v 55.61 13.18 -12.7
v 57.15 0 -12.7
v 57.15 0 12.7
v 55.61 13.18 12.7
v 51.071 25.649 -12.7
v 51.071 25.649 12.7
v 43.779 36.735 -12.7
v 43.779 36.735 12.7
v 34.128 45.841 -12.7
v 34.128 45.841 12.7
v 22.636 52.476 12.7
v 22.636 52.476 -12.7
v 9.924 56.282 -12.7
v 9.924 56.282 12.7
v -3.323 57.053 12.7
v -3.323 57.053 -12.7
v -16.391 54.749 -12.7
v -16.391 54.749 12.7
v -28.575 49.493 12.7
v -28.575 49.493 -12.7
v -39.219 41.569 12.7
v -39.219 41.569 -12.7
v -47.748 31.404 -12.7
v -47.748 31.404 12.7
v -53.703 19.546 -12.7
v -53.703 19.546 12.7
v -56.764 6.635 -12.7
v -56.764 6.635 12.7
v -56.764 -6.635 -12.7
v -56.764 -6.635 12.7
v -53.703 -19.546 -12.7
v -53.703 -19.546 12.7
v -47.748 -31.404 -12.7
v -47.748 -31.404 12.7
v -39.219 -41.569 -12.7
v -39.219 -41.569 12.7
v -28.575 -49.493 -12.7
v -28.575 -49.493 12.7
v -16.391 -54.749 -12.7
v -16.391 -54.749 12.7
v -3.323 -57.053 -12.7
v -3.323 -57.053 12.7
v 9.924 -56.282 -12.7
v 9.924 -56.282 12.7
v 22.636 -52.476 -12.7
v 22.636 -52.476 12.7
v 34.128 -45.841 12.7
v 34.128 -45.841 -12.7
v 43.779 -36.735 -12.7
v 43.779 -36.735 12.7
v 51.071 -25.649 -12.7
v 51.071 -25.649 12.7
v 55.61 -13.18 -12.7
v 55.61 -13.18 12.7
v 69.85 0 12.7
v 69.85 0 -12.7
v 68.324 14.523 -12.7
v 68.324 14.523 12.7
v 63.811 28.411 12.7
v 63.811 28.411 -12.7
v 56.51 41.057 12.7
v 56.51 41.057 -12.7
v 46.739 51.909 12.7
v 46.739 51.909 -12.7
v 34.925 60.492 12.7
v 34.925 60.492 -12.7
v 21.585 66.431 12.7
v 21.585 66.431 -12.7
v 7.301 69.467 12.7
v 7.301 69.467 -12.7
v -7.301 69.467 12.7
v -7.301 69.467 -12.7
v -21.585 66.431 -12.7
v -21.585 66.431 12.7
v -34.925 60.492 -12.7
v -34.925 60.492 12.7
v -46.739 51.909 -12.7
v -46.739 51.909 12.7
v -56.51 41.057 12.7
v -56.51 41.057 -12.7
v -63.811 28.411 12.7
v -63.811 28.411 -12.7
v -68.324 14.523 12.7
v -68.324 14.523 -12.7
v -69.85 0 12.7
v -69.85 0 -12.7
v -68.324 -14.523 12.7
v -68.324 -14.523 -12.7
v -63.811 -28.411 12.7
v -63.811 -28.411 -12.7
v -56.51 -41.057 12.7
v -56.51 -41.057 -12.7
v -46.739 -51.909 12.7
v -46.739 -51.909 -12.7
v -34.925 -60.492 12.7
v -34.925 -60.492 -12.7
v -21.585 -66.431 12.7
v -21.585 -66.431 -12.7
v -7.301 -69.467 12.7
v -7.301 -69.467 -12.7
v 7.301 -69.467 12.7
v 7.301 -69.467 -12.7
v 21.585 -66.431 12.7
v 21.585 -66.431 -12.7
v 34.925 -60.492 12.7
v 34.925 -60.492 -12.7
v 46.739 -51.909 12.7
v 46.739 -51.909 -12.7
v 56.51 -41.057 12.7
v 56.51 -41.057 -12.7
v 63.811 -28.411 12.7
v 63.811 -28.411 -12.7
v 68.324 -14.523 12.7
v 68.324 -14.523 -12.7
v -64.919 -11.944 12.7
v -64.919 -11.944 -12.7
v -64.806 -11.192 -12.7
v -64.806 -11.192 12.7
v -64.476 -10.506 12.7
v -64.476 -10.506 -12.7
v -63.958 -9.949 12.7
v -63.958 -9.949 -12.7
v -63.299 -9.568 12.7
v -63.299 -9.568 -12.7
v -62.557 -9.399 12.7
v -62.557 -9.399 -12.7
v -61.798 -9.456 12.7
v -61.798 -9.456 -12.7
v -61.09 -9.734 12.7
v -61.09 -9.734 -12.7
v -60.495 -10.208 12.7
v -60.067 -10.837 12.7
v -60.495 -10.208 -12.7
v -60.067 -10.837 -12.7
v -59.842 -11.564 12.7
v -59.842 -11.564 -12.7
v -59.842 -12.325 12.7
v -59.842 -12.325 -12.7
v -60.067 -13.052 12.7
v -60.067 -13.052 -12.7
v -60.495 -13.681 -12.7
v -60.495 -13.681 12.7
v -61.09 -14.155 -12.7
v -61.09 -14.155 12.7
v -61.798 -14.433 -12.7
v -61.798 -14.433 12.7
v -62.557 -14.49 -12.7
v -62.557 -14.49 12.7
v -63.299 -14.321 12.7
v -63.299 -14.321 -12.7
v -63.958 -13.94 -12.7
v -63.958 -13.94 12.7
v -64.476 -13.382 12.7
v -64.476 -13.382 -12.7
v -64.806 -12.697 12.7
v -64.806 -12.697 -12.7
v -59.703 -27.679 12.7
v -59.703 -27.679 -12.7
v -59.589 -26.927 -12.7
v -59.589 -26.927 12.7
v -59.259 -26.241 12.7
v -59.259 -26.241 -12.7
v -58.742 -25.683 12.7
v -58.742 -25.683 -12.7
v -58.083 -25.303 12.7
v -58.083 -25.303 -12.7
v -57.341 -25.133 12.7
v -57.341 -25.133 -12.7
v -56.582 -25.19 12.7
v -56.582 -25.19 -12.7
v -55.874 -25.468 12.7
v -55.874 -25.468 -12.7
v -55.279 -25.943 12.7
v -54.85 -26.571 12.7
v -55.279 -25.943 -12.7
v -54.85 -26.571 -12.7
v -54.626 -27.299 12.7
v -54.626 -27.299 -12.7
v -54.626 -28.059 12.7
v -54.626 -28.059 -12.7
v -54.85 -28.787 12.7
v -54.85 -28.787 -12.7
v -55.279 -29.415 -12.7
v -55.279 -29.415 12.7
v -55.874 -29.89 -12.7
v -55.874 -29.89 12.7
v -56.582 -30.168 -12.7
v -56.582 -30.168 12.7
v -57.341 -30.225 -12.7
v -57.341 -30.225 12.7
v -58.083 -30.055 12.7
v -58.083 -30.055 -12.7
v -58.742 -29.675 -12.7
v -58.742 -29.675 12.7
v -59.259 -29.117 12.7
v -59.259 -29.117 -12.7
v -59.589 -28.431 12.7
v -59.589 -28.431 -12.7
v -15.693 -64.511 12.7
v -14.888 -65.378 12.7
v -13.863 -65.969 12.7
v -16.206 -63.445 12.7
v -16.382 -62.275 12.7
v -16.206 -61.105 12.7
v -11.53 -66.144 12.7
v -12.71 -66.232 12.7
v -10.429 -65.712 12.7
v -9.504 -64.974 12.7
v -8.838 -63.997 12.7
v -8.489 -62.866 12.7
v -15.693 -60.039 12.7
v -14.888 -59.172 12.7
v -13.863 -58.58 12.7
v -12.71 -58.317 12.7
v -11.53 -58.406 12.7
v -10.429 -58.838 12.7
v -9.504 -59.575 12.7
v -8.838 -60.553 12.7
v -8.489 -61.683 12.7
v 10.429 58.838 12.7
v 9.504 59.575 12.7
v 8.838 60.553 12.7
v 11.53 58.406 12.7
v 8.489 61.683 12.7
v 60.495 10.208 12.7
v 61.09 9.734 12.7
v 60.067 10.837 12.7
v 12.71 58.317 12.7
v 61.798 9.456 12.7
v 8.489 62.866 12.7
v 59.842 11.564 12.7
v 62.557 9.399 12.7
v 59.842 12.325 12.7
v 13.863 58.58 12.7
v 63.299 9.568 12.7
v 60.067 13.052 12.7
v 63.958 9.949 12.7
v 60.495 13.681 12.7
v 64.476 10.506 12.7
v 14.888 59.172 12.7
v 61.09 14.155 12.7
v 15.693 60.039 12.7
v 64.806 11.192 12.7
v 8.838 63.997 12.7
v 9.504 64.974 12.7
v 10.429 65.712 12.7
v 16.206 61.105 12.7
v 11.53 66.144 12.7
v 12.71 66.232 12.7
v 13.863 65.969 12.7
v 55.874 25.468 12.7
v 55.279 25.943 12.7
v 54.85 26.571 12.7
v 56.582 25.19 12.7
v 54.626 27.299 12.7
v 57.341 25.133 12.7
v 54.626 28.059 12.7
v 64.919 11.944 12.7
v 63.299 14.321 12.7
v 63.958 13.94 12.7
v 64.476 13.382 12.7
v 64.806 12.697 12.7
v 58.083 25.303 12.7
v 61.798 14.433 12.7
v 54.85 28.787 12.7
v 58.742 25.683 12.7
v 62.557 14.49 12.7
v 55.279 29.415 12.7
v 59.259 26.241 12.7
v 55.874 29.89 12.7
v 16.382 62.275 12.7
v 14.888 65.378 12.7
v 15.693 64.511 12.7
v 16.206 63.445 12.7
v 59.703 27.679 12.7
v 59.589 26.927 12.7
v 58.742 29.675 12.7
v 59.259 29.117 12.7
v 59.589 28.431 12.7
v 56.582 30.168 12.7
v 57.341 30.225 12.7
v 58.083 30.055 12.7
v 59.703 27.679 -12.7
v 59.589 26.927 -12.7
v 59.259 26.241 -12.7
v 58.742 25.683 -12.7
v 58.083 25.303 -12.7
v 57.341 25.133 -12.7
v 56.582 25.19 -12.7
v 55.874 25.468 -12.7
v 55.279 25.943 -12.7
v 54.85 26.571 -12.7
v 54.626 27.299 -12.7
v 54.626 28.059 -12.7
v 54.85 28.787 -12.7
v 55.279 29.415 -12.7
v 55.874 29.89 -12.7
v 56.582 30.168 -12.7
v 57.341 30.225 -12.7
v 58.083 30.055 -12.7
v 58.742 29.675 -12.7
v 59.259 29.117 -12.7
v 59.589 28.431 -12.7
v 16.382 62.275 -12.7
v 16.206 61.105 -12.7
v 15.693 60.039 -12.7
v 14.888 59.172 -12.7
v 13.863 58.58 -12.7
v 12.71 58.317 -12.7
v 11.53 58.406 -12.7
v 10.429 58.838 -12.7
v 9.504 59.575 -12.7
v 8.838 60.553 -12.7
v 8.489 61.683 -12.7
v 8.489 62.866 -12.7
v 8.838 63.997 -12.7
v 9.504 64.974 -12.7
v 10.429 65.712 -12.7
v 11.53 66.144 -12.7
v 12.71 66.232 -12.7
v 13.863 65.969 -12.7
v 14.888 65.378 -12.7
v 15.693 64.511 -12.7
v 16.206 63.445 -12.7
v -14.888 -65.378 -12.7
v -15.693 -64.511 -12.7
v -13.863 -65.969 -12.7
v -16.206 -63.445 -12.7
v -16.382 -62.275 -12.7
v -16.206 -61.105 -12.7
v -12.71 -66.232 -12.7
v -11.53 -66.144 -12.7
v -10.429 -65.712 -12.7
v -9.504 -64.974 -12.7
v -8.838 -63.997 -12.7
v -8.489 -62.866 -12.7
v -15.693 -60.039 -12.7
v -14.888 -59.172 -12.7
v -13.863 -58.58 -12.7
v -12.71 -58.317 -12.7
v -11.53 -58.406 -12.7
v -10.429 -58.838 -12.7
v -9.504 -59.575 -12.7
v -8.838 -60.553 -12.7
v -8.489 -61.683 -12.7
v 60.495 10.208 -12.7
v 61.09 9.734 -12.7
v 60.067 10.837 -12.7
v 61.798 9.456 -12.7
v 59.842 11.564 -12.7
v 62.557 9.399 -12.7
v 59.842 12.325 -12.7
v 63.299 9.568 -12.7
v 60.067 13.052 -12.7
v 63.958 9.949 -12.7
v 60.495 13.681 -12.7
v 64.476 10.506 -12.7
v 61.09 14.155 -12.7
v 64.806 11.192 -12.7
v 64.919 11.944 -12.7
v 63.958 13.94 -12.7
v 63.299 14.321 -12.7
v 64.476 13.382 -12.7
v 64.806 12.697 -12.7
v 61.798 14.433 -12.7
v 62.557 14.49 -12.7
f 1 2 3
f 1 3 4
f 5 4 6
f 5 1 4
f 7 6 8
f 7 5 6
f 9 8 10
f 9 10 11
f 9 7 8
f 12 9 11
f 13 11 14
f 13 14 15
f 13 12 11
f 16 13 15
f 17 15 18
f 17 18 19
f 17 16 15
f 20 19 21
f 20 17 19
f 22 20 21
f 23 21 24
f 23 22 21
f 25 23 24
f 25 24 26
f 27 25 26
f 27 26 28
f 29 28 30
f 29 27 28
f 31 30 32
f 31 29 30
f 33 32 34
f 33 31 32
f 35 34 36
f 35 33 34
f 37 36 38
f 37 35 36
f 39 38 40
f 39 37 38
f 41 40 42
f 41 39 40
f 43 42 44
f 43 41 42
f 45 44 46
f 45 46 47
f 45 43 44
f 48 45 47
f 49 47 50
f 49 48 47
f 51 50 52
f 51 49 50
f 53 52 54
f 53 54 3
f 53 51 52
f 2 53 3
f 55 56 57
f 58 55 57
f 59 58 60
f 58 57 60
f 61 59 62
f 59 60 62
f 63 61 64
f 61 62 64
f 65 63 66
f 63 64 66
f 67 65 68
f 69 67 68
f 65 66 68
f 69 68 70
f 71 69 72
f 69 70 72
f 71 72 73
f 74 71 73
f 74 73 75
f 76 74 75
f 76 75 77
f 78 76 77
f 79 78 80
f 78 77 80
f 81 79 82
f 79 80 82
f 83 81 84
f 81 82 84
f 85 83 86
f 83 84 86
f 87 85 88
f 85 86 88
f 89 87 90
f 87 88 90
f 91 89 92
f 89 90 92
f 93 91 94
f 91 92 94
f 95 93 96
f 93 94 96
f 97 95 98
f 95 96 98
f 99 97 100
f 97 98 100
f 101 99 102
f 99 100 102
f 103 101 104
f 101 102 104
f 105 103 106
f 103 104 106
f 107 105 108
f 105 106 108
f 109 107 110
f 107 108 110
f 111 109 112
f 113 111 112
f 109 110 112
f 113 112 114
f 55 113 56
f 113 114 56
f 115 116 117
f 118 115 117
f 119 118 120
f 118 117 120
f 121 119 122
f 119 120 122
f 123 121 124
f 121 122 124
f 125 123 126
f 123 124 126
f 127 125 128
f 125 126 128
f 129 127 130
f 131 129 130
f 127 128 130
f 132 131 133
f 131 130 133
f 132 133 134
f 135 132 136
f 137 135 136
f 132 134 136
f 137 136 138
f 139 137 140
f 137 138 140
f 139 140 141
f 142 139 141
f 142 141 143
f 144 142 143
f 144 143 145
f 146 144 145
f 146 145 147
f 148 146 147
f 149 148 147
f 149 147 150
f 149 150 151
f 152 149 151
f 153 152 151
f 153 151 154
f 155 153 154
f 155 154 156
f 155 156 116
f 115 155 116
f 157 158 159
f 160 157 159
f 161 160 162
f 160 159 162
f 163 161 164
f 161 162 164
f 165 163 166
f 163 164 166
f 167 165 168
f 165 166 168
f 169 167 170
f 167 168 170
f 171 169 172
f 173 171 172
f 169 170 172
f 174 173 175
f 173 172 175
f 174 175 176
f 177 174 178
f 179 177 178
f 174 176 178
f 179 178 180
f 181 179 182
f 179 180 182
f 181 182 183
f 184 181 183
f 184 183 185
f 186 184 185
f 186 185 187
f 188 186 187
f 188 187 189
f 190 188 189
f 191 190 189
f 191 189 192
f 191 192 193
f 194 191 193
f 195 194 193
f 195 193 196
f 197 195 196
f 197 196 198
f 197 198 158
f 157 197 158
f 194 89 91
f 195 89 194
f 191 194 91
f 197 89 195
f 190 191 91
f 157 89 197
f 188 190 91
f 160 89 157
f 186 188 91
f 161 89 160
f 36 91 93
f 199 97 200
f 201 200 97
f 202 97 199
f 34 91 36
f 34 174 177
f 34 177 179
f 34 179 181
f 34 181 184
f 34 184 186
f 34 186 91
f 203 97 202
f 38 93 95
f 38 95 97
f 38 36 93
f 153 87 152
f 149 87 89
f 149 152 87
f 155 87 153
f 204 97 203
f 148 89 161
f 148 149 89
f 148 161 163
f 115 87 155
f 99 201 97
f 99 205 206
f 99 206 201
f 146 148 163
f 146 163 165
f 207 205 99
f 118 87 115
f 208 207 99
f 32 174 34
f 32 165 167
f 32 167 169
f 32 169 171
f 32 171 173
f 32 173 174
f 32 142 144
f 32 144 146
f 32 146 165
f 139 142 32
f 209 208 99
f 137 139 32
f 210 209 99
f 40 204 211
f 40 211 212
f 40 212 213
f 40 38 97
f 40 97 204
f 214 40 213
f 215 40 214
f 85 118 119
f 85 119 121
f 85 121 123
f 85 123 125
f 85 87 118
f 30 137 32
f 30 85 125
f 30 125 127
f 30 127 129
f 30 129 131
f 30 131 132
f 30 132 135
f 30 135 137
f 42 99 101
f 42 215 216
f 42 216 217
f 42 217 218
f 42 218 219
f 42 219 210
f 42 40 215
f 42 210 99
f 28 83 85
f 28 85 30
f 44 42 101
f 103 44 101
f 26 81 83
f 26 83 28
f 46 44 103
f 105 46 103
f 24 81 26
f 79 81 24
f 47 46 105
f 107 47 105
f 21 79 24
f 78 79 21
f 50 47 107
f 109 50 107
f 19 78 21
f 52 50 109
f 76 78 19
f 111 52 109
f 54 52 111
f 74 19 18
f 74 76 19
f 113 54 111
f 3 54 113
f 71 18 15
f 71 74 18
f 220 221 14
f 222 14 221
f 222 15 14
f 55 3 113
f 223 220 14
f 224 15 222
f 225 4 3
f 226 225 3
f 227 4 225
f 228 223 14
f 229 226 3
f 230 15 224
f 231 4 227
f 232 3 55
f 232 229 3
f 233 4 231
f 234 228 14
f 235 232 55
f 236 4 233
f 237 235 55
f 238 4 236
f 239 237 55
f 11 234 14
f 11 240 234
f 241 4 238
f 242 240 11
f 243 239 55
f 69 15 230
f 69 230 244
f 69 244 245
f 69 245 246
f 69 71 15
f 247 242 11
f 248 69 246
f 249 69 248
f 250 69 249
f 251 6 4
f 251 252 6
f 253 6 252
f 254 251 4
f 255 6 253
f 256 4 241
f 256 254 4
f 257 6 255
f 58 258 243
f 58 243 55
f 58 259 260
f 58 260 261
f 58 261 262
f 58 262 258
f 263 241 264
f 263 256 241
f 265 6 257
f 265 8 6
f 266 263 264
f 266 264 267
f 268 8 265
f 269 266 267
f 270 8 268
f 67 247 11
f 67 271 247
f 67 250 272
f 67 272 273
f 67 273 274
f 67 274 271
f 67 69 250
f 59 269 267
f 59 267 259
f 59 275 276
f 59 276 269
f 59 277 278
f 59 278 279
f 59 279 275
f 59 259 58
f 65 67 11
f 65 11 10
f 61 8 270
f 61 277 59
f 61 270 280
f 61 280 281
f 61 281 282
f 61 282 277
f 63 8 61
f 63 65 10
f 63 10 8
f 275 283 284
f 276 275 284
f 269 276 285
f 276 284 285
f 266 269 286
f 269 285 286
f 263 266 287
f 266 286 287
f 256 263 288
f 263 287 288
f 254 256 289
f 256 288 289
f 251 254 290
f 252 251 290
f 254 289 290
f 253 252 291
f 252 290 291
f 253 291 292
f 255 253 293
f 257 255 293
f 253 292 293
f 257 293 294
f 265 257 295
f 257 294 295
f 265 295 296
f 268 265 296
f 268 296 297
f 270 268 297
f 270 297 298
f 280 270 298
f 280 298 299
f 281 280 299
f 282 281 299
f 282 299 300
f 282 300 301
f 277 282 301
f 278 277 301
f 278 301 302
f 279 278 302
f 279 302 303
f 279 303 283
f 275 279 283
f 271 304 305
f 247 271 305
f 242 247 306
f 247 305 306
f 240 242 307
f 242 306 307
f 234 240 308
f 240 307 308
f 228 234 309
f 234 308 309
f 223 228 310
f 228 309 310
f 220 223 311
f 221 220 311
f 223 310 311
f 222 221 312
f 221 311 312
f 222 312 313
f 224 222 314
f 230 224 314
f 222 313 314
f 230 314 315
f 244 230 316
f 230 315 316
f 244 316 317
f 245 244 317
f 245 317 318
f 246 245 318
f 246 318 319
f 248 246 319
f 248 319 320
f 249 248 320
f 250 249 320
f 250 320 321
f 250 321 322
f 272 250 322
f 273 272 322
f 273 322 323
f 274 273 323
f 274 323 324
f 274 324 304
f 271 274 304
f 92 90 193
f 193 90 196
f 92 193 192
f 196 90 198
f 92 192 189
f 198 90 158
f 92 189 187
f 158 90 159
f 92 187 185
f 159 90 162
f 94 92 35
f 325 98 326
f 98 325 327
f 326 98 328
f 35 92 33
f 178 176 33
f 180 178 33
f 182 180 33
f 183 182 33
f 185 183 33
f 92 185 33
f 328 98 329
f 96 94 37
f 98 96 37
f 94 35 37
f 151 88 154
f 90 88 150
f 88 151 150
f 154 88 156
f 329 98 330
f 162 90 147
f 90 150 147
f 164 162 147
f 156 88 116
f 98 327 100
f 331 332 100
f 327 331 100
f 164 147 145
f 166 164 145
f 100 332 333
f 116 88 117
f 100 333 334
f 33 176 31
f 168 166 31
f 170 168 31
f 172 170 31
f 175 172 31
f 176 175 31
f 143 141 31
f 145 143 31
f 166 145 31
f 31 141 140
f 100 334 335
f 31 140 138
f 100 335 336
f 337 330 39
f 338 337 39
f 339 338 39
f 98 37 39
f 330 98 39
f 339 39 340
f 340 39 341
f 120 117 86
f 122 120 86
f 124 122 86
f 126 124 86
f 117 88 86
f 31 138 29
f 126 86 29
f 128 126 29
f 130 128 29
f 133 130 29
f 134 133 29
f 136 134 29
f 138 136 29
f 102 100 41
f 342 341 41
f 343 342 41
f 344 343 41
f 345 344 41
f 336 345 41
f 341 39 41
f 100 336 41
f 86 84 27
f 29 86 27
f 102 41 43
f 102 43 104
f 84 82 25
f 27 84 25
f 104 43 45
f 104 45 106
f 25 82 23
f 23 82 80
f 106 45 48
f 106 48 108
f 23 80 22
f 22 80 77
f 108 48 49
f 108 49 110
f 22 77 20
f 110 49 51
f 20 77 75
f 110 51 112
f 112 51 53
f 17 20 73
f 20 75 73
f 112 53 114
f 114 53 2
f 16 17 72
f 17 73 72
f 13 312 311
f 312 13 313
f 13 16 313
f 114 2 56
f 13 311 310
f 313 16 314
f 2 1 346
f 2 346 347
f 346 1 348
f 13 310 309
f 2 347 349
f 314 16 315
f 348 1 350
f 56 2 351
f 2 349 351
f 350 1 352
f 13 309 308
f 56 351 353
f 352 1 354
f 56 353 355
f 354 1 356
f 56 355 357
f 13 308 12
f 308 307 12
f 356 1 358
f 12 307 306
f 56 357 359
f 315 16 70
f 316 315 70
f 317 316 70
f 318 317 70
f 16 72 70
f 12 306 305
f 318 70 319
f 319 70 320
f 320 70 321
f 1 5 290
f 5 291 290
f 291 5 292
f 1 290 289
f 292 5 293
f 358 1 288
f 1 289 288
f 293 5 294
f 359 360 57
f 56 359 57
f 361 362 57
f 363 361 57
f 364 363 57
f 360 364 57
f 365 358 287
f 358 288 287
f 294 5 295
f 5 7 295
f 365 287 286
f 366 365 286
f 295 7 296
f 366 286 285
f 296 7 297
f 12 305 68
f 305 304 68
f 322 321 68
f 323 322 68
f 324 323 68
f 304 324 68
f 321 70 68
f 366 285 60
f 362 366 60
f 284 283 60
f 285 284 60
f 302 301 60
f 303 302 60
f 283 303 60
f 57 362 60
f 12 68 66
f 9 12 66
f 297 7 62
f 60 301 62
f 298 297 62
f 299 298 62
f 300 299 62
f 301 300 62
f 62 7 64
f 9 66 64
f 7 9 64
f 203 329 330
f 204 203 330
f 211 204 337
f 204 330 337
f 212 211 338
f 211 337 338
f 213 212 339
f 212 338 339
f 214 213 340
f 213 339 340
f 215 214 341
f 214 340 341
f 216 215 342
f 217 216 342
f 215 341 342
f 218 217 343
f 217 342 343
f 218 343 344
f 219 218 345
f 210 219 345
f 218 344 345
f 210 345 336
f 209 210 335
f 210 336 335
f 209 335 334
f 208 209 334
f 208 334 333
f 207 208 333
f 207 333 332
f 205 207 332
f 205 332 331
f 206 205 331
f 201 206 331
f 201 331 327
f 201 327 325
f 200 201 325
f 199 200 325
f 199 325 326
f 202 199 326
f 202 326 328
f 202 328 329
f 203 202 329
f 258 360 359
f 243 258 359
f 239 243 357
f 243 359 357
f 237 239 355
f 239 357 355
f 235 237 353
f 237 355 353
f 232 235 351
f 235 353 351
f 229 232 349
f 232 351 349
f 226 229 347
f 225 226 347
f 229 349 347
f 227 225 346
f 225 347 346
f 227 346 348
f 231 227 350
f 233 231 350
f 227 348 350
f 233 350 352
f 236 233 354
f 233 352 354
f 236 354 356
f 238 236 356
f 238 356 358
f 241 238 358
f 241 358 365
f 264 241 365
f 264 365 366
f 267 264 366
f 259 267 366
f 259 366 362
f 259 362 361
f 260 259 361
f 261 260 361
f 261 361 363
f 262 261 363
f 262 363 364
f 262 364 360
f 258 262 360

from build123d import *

# Parameters (mm, degrees)
BOSS_EXTRUDE1_DEPTH            = 12.7
BOSS_EXTRUDE1_DEPTH_BACK       = 12.7
SKETCH3_R                      = 69.85
SKETCH3_R_2                    = 57.15
TAP_DRILL_FOR_1_4_20_TAP1_D    = 5.1054
F_5_16_0_3125_DIAMETER_HOLE1_D = 7.9375
CIRPATTERN1_COUNT              = 2


with BuildPart() as part:
    # Sketch3 → Boss-Extrude1 (new, two sides: drawn at the far end of the back side and taken through both)
    with BuildSketch(Plane.XY.offset(-BOSS_EXTRUDE1_DEPTH_BACK)):
        Circle(SKETCH3_R)
        Circle(SKETCH3_R_2, mode=Mode.SUBTRACT)
    extrude(amount=BOSS_EXTRUDE1_DEPTH + BOSS_EXTRUDE1_DEPTH_BACK)

    # Tap Drill for 1/4-20 Tap1 (through all)
    with Locations(Plane.XY.offset(12.7)):
        with Locations((-57.15, -27.679008291), (-62.366515468, -11.944360527)):
            tap_drill_for_1_4_20_tap1 = Hole(TAP_DRILL_FOR_1_4_20_TAP1_D / 2)

    # 5/16 (0.3125) Diameter Hole1 (through all)
    with Locations(Plane.XY.offset(12.7)):
        with Locations((-12.413435939, -62.274847316)):
            f_5_16_0_3125_diameter_hole1 = Hole(F_5_16_0_3125_DIAMETER_HOLE1_D / 2)

    # CirPattern1: Tap Drill for 1/4-20 Tap1, 5/16 (0.3125) Diameter Hole1 ×2 about axis
    cirpattern1_axis = Axis((0, 0, 0), (0, 0, 1))
    add([tap_drill_for_1_4_20_tap1.rotate(cirpattern1_axis, i * 360 / CIRPATTERN1_COUNT) for i in range(1, CIRPATTERN1_COUNT)], mode=Mode.SUBTRACT)
    add([f_5_16_0_3125_diameter_hole1.rotate(cirpattern1_axis, i * 360 / CIRPATTERN1_COUNT) for i in range(1, CIRPATTERN1_COUNT)], mode=Mode.SUBTRACT)


solid = part.part
